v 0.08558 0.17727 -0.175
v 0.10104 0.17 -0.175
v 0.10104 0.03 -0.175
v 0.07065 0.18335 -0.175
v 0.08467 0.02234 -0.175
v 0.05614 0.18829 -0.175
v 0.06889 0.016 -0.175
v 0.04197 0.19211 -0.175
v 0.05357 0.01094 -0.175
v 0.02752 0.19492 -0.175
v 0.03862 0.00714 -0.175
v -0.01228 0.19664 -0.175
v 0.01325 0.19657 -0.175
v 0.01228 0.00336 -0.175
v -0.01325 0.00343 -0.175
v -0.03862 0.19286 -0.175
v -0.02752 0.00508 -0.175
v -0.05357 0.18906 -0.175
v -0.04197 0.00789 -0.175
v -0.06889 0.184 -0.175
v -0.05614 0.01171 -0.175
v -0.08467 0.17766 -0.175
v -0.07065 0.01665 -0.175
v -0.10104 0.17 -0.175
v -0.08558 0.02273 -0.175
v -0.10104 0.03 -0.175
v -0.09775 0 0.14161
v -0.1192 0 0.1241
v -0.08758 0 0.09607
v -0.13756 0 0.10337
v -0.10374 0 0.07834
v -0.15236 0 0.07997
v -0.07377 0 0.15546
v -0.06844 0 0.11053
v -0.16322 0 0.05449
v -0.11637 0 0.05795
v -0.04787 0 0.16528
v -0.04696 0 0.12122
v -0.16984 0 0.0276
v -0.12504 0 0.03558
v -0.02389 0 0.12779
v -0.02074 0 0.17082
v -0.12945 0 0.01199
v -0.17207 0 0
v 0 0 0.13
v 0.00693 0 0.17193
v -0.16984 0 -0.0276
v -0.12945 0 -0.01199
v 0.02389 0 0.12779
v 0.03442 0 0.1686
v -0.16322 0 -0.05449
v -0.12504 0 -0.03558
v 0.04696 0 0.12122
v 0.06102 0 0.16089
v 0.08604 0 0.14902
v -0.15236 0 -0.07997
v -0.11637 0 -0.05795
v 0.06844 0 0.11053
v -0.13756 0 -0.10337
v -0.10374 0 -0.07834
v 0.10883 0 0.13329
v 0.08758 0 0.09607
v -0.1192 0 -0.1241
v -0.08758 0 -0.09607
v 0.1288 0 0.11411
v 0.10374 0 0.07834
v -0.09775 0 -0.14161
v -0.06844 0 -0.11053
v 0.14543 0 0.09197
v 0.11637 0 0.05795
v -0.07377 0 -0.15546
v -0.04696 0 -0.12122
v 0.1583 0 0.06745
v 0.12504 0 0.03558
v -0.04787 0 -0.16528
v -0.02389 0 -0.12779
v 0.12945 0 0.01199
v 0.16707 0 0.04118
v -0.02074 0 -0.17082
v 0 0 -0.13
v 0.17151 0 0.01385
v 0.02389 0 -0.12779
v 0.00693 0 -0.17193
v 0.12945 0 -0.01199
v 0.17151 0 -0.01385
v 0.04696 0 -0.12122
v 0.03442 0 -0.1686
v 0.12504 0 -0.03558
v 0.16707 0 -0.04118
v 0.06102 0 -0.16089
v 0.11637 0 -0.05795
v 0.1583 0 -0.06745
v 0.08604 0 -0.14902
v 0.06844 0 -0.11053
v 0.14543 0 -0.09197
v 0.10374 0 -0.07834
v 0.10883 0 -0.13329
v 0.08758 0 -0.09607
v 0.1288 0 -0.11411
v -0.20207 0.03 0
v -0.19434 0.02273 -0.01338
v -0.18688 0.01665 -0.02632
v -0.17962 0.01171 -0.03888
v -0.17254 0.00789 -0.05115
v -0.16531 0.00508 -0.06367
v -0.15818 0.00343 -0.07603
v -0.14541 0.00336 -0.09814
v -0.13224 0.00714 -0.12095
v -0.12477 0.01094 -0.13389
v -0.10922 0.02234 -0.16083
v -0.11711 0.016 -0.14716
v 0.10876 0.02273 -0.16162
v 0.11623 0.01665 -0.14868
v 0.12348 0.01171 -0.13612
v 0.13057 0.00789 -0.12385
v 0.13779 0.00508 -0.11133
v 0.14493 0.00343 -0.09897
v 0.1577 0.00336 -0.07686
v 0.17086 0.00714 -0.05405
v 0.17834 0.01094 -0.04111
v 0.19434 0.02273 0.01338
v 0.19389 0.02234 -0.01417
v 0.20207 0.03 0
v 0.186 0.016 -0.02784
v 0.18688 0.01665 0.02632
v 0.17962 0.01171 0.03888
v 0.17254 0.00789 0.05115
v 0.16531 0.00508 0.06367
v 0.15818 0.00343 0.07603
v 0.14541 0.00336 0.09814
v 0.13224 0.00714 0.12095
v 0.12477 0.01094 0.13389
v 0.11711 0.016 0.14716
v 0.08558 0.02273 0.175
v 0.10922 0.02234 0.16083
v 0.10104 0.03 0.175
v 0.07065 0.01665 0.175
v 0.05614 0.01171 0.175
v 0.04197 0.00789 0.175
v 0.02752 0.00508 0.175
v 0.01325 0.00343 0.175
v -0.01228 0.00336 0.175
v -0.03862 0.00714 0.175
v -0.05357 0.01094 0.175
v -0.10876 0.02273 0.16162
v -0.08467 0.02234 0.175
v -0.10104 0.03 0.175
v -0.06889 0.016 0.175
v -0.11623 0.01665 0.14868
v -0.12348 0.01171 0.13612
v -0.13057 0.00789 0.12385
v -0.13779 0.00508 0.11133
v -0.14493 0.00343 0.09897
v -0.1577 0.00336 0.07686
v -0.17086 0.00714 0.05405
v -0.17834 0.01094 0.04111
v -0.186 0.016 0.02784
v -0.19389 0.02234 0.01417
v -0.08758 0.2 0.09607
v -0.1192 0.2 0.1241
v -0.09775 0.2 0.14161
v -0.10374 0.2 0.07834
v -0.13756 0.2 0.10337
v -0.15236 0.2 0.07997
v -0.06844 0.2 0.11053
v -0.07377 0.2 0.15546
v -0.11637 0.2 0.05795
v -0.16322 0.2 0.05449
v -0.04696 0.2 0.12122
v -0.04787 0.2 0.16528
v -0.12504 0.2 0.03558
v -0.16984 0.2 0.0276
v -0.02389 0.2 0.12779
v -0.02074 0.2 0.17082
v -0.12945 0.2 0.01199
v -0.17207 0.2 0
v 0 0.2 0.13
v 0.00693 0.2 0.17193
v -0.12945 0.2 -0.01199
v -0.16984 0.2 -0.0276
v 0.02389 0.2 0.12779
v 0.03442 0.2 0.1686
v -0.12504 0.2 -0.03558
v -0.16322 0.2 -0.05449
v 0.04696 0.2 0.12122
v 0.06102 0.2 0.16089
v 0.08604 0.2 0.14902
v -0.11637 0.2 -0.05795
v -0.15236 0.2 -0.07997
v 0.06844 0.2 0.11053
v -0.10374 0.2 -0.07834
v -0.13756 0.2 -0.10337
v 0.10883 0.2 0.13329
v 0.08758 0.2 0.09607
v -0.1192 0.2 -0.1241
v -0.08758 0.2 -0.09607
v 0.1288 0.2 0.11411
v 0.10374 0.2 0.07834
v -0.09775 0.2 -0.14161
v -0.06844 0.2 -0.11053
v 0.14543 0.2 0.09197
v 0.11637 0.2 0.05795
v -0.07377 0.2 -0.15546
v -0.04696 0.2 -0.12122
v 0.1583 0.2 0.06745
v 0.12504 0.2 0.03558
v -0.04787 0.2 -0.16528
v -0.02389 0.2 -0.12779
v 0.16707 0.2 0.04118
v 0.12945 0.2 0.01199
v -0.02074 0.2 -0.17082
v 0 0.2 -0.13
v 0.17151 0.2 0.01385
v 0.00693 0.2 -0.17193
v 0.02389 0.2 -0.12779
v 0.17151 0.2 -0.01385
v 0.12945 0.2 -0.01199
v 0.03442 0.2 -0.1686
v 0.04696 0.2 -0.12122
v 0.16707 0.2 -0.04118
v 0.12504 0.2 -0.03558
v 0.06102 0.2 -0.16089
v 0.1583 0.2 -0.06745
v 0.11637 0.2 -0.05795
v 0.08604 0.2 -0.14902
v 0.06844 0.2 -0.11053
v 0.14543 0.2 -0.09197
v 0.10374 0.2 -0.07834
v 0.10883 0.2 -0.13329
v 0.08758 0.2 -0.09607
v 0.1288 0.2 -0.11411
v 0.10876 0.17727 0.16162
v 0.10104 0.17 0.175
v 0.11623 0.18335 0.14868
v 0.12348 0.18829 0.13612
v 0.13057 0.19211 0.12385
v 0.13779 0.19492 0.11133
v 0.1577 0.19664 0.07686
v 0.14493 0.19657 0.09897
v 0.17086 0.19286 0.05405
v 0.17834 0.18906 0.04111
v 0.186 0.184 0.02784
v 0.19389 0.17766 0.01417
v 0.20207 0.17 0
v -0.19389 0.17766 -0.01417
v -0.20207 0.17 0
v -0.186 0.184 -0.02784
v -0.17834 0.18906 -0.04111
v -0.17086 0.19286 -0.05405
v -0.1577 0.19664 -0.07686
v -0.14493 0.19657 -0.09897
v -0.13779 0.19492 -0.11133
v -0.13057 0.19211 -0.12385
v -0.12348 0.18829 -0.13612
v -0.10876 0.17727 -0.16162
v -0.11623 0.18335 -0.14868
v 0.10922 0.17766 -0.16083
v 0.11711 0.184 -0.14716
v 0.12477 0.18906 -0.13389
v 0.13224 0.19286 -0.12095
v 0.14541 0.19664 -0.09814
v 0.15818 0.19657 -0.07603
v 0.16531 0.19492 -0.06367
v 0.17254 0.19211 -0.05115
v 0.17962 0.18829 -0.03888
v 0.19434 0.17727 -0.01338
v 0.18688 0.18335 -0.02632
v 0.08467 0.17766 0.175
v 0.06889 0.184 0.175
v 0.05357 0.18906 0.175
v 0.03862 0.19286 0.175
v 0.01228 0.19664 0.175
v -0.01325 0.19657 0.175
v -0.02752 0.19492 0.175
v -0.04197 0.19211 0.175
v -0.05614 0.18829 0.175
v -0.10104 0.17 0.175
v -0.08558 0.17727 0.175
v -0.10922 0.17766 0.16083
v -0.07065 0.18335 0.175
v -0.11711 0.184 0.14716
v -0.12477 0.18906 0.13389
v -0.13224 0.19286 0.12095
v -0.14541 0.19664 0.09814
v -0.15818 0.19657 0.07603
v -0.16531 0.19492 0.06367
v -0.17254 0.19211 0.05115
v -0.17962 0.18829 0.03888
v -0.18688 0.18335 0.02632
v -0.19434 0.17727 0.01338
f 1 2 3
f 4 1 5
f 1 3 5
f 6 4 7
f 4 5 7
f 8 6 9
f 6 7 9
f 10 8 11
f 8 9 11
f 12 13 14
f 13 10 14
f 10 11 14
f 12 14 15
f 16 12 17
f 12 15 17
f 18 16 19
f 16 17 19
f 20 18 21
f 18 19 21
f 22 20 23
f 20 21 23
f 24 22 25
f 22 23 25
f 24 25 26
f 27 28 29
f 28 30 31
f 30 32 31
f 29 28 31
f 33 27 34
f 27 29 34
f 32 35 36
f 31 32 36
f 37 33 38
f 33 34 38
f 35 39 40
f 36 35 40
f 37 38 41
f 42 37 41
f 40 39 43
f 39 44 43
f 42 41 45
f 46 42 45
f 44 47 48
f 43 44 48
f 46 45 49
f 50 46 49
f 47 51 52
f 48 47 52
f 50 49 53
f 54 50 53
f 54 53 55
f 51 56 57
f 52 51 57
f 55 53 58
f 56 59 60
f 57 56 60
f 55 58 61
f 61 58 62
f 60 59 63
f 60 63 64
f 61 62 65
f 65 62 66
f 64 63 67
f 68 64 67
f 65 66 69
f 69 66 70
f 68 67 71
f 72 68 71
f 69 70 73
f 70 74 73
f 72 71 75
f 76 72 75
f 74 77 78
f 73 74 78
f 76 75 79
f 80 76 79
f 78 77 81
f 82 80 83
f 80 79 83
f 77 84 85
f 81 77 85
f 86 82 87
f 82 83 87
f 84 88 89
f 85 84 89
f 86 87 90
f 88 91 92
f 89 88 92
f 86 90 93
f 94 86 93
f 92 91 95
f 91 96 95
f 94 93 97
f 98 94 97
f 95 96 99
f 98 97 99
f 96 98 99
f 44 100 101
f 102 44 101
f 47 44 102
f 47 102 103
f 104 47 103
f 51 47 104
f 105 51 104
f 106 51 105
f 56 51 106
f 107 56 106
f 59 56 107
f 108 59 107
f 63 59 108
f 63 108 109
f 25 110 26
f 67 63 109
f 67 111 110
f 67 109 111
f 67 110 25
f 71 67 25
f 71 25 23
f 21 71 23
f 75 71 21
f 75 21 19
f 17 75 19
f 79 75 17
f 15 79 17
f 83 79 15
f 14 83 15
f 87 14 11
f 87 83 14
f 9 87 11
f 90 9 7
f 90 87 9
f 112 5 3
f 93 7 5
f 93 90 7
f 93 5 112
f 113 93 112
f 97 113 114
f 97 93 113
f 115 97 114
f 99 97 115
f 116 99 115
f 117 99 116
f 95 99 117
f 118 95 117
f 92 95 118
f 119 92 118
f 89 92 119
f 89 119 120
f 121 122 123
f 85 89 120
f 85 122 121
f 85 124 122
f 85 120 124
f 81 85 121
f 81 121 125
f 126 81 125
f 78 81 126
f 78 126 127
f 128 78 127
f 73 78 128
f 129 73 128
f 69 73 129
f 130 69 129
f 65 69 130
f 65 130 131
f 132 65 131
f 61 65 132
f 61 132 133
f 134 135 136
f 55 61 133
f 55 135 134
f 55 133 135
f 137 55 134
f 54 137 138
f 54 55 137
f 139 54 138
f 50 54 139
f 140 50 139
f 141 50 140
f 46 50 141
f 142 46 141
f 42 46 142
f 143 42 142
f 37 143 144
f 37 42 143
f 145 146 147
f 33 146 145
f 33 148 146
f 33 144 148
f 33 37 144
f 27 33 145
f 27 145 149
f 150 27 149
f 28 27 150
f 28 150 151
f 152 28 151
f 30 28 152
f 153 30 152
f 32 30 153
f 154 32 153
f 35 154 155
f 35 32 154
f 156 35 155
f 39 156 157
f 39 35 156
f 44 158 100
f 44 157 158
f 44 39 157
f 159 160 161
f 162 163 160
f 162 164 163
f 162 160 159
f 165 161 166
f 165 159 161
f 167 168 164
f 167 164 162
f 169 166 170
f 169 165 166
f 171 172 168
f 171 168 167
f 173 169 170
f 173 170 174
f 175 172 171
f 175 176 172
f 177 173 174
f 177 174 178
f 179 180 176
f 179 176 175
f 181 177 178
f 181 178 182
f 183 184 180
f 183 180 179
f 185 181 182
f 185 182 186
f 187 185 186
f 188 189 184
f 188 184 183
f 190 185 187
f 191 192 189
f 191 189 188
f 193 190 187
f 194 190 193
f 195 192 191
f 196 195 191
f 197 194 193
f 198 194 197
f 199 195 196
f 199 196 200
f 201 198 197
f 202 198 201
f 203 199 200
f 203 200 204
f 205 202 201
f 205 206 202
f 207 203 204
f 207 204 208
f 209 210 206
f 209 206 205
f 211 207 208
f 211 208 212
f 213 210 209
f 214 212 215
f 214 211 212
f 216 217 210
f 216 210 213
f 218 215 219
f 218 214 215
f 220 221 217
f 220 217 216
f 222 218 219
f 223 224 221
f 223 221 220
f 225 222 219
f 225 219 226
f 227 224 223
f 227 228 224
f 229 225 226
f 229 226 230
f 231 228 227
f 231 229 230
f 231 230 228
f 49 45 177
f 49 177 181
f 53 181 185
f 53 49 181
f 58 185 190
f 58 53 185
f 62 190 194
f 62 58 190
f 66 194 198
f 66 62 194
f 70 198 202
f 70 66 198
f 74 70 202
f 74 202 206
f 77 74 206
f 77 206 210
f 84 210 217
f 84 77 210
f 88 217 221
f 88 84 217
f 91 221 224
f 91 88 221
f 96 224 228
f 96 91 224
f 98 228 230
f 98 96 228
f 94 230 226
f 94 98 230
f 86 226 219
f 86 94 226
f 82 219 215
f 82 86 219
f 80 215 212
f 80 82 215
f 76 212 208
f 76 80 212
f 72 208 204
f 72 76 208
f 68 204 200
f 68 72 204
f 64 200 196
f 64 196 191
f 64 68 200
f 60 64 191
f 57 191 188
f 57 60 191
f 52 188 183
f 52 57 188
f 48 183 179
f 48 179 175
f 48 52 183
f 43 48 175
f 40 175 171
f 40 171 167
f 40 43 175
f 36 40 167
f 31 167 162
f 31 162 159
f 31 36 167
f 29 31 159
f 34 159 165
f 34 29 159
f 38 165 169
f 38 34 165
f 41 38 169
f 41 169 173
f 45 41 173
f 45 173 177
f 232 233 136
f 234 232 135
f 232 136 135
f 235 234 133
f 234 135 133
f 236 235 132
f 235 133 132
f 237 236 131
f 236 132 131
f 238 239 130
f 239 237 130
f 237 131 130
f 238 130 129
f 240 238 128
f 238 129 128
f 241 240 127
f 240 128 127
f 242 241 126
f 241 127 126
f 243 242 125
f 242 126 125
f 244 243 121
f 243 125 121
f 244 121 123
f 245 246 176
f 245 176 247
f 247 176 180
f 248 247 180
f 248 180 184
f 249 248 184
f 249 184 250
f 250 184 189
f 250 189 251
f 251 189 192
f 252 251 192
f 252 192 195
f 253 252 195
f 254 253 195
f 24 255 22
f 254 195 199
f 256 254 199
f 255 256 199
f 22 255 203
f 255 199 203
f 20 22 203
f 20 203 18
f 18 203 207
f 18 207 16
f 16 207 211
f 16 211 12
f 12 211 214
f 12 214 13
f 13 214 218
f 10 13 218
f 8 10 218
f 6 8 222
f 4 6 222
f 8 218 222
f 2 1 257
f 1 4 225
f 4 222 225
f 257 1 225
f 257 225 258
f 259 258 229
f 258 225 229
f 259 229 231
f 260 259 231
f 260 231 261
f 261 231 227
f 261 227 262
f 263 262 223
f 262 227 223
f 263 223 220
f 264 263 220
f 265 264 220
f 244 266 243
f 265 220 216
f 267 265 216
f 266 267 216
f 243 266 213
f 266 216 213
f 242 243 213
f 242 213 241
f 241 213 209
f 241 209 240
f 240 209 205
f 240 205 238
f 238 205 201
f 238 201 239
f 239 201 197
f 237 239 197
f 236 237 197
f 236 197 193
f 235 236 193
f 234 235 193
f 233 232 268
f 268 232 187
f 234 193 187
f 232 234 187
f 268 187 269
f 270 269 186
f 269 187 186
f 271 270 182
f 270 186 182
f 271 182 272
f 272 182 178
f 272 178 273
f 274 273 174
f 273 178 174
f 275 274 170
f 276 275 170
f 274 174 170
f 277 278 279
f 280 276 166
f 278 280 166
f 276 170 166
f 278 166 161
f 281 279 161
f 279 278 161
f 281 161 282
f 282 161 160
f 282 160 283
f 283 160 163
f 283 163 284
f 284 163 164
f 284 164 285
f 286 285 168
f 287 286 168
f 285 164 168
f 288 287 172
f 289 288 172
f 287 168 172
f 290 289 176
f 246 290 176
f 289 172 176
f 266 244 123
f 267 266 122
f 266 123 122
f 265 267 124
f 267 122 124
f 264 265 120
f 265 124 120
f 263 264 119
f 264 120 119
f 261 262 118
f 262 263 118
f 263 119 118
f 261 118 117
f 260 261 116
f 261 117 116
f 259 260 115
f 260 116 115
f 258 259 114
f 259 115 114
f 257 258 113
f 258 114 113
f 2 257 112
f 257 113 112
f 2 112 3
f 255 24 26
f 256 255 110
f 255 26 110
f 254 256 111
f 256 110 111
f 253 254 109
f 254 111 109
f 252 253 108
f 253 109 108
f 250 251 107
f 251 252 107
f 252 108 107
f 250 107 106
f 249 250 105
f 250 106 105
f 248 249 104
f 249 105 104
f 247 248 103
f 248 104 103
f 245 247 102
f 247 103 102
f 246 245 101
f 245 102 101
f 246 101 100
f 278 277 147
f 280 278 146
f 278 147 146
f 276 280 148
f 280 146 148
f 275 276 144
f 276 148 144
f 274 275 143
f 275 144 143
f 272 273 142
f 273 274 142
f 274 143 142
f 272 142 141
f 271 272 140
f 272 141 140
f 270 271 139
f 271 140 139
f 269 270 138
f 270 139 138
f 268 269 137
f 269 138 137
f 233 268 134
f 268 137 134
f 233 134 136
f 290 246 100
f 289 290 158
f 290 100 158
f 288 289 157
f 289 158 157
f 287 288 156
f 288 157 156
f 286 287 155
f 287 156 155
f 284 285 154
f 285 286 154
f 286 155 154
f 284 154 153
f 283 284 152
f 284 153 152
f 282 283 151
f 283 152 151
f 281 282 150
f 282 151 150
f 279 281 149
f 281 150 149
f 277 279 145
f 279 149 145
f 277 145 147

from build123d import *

# Parameters (mm, degrees)
SKETCH1_R           = 0.13
BOSS_EXTRUDE1_DEPTH = 0.2


with BuildPart() as part:
    # Sketch1 → Boss-Extrude1 (new body)
    with BuildSketch(Plane(origin=(0, 0, 0), x_dir=(1, 0, 0), z_dir=(0, 1, 0))):
        Polygon((0.101036297, 0.175), (-0.101036297, 0.175), (-0.202072594, 0), (-0.101036297, -0.175), (0.101036297, -0.175), (0.202072594, 0), align=None)
        with Locations(Location((0, 0, 0), (0, 0, 270))):
            Circle(SKETCH1_R, mode=Mode.SUBTRACT)
    extrude(amount=BOSS_EXTRUDE1_DEPTH)

    # Sketch3 → Cut-Revolve5 (revolve, cut)
    with BuildSketch(Plane.XY, mode=Mode.PRIVATE) as cut_revolve5_sk:
        Polygon((0.172072594, 0.2), (0.202072594, 0.2), (0.202072594, 0.17), align=None)
        Polygon((0.202072594, 0), (0.202072594, 0.03), (0.172072594, 0), align=None)
    revolve(cut_revolve5_sk.sketch.rotate(Axis((0, 0.2, 0), (0, -1, 0)), 180), axis=Axis((0, 0.2, 0), (0, -1, 0)), mode=Mode.SUBTRACT)


solid = part.part
